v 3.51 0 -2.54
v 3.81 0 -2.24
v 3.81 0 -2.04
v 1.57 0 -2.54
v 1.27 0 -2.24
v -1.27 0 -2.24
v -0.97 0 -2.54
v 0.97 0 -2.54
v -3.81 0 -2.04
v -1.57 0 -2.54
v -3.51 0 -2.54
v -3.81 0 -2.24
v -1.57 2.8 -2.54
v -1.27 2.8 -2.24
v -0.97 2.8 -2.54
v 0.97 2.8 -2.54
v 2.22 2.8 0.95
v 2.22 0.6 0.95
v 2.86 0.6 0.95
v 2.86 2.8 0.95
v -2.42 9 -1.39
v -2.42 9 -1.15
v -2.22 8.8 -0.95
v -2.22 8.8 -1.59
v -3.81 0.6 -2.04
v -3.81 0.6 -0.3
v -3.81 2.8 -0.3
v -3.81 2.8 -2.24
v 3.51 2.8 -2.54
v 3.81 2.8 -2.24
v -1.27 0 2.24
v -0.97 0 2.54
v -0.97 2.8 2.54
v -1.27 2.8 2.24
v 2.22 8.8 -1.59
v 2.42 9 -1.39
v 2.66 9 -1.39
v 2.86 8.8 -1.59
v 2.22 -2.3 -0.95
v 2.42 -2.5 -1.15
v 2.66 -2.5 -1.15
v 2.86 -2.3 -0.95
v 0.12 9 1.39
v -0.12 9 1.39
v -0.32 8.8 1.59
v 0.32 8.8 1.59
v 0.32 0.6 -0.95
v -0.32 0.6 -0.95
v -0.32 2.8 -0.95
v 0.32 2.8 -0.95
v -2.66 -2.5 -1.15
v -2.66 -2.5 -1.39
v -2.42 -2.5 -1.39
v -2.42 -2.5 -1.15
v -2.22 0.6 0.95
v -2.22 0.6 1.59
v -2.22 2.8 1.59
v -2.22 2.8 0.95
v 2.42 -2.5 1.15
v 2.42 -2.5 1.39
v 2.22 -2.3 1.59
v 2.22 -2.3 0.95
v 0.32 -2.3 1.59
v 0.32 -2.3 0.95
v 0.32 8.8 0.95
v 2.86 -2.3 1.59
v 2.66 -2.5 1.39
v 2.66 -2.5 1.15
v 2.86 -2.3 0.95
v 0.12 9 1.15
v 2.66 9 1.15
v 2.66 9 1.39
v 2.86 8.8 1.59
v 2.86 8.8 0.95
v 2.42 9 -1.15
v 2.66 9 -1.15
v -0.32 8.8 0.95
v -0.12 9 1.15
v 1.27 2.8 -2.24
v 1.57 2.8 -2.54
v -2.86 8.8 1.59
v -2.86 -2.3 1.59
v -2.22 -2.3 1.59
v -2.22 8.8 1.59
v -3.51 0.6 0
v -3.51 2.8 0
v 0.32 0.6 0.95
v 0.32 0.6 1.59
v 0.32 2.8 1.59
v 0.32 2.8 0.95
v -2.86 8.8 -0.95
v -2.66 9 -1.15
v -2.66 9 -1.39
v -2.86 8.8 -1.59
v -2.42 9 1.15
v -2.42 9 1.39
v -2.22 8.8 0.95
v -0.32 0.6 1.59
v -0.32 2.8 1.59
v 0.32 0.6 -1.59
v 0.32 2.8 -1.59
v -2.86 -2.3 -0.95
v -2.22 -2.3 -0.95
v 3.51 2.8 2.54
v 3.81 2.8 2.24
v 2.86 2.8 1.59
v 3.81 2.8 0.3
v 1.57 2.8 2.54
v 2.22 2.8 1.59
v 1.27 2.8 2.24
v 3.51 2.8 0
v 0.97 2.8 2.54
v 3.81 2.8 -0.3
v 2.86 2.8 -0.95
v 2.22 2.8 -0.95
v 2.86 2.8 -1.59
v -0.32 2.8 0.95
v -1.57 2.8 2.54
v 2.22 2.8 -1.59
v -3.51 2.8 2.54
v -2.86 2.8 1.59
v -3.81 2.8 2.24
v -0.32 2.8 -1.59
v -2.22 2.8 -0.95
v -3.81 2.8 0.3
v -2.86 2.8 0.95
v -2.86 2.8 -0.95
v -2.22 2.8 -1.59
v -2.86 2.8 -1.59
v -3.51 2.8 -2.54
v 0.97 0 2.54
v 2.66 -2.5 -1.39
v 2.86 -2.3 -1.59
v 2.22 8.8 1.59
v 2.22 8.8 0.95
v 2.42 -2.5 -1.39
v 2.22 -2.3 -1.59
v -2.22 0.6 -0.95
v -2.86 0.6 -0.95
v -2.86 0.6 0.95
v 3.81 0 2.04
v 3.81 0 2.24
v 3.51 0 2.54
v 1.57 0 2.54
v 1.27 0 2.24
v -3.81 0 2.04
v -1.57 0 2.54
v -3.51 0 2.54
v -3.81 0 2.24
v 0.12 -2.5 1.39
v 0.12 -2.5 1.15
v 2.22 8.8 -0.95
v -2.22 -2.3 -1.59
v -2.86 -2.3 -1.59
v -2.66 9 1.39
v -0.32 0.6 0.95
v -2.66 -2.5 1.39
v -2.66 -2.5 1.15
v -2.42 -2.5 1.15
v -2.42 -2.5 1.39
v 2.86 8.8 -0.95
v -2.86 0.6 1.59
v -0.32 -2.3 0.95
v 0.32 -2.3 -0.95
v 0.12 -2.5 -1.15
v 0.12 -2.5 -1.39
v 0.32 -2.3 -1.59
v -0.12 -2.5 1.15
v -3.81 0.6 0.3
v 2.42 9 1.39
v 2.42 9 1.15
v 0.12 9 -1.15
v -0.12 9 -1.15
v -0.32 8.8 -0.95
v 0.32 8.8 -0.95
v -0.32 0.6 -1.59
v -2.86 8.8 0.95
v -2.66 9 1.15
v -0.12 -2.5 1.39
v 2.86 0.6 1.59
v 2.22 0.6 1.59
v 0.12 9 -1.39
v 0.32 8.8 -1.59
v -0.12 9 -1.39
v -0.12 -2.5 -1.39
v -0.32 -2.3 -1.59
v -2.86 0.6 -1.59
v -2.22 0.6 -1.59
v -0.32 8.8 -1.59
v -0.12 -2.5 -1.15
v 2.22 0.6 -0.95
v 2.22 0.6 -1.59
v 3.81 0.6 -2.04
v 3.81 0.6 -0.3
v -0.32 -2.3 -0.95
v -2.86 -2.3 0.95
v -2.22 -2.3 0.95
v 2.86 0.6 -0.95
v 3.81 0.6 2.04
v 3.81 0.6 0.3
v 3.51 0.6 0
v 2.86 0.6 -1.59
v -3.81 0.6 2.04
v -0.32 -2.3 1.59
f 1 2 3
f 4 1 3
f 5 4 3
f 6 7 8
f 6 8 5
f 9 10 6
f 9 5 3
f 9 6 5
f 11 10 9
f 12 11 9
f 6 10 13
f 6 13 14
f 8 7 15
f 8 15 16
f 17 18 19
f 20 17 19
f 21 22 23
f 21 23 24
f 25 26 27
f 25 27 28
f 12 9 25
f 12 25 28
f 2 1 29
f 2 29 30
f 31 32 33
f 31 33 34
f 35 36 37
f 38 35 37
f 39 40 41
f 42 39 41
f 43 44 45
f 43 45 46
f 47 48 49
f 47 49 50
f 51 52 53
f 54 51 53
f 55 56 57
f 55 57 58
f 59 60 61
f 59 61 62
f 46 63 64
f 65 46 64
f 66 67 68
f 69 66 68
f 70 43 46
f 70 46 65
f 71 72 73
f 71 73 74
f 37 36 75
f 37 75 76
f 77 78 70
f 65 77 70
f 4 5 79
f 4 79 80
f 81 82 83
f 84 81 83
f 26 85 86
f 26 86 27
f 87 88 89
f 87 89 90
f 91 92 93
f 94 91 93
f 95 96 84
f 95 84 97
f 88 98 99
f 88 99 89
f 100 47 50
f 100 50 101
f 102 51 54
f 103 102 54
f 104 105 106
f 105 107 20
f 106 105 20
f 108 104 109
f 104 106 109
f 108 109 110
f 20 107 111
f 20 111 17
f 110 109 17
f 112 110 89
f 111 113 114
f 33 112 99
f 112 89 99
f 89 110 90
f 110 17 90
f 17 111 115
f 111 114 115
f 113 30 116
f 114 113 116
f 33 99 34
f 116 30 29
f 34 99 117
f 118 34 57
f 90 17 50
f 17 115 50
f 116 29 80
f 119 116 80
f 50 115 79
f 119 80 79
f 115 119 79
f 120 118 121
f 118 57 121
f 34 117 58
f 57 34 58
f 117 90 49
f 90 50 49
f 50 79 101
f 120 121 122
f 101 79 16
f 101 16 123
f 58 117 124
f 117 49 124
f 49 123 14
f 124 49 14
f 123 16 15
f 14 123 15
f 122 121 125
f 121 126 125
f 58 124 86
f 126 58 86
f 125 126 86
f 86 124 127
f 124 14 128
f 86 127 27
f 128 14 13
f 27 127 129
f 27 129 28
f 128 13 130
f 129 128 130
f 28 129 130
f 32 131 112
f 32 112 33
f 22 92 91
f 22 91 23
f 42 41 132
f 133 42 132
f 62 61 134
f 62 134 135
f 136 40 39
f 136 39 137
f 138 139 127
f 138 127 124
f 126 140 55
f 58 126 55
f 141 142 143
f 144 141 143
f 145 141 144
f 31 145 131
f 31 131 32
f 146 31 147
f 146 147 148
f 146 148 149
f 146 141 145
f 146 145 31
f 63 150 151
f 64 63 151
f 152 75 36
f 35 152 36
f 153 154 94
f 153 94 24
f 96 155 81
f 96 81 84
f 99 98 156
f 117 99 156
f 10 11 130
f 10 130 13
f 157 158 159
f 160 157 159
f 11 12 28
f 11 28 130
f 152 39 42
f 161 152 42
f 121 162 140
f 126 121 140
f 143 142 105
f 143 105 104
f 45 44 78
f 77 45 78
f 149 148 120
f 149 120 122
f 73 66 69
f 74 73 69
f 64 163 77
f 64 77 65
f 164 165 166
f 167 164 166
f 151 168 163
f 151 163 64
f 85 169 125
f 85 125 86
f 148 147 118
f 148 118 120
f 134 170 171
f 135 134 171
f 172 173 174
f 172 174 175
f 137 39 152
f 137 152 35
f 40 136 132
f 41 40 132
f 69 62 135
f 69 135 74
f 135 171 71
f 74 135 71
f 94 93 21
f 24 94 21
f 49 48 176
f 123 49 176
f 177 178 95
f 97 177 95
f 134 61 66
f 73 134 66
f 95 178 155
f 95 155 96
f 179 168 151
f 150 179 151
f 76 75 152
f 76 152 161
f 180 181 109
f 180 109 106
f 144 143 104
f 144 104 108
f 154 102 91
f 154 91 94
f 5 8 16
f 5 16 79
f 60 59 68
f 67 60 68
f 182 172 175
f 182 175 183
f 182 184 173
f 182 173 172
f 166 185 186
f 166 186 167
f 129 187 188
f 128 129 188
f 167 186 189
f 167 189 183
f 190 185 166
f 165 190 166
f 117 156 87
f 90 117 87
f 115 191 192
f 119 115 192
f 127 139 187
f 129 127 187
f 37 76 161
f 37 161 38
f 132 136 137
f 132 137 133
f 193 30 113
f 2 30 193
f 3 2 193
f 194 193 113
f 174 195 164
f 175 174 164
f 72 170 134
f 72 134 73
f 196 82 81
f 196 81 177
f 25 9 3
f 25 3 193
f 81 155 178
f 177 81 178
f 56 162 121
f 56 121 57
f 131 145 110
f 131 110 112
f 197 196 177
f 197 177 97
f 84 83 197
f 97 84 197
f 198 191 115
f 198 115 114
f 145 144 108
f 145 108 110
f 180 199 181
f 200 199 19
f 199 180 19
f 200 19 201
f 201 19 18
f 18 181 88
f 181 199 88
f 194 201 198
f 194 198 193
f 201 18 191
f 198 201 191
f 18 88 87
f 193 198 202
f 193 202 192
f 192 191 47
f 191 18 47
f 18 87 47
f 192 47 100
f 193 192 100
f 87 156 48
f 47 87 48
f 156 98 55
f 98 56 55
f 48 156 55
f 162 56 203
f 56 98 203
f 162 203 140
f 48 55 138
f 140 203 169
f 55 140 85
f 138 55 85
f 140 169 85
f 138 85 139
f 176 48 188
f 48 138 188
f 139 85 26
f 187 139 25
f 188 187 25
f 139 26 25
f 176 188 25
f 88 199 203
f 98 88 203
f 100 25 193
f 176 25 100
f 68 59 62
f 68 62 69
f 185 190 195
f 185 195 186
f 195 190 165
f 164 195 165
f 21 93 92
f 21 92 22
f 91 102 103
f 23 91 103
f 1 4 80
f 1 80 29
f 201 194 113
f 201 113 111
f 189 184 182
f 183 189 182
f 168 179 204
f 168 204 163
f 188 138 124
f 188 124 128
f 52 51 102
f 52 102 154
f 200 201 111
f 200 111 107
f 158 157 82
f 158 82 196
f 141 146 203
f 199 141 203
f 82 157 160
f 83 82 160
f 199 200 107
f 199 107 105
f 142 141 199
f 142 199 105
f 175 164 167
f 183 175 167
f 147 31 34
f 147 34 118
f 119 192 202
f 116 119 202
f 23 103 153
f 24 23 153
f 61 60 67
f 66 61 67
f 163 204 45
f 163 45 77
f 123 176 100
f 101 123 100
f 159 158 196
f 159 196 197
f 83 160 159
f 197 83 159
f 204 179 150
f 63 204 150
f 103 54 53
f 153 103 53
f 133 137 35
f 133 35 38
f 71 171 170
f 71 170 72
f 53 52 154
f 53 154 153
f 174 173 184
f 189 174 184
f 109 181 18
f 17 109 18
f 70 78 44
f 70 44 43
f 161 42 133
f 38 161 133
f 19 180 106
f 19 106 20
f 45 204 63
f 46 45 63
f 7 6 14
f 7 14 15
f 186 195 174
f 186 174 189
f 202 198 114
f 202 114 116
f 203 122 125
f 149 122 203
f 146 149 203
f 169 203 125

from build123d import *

# Parameters (mm, degrees)
SKETCH1_W                  = 0.64
SKETCH1_H                  = 0.64
BOSS_EXTRUDE1_DEPTH        = 2.8
CUT_EXTRUDE1_DEPTH         = 6.367280503
CUT_EXTRUDE1_DEPTH_BACK    = 6.367280503
SKETCH2_W                  = 4.08
SKETCH2_H                  = 0.6
BOSS_EXTRUDE2_DEPTH        = 9
BOSS_EXTRUDE2_DEPTH_BACK   = 2.5
SKETCH1_2_W                = 0.64
SKETCH1_2_H                = 0.64
BOSS_EXTRUDE2_2_DEPTH      = 9
BOSS_EXTRUDE2_2_DEPTH_BACK = 2.5
BOSS_EXTRUDE2_3_DEPTH      = 9
BOSS_EXTRUDE2_3_DEPTH_BACK = 2.5
BOSS_EXTRUDE2_4_DEPTH      = 9
BOSS_EXTRUDE2_4_DEPTH_BACK = 2.5
BOSS_EXTRUDE2_5_DEPTH      = 9
BOSS_EXTRUDE2_5_DEPTH_BACK = 2.5
BOSS_EXTRUDE2_6_DEPTH      = 9
BOSS_EXTRUDE2_6_DEPTH_BACK = 2.5
CHAMFER1_SIZE              = 0.2
CHAMFER2_SIZE              = 0.2
CHAMFER3_SIZE              = 0.2
CHAMFER4_SIZE              = 0.2
CHAMFER5_SIZE              = 0.2
CHAMFER6_SIZE              = 0.2


with BuildPart() as part:
    # Sketch1 → Boss-Extrude1 (new body)
    with BuildSketch(Plane(origin=(0, 0, 0), x_dir=(1, 0, 0), z_dir=(0, 1, 0))):
        Polygon((-3.81, 2.24), (-3.51, 2.54), (-1.57, 2.54), (-1.27, 2.24), (-0.97, 2.54), (0.97, 2.54), (1.27, 2.24), (1.57, 2.54), (3.51, 2.54), (3.81, 2.24), (3.81, 0.3), (3.51, 0), (3.81, -0.3), (3.81, -2.24), (3.51, -2.54), (1.57, -2.54), (1.27, -2.24), (0.97, -2.54), (-0.97, -2.54), (-1.27, -2.24), (-1.57, -2.54), (-3.51, -2.54), (-3.81, -2.24), (-3.81, -0.3), (-3.51, 0), (-3.81, 0.3), align=None)
        with Locations((-2.54, 1.27)):
            Rectangle(SKETCH1_W, SKETCH1_H, mode=Mode.SUBTRACT)
        with Locations((0, 1.27)):
            Rectangle(SKETCH1_W, SKETCH1_H, mode=Mode.SUBTRACT)
        with Locations((2.54, 1.27)):
            Rectangle(SKETCH1_W, SKETCH1_H, mode=Mode.SUBTRACT)
        with Locations((0, -1.27)):
            Rectangle(SKETCH1_W, SKETCH1_H, mode=Mode.SUBTRACT)
        with Locations((2.54, -1.27)):
            Rectangle(SKETCH1_W, SKETCH1_H, mode=Mode.SUBTRACT)
        with Locations((-2.54, -1.27)):
            Rectangle(SKETCH1_W, SKETCH1_H, mode=Mode.SUBTRACT)
    extrude(amount=BOSS_EXTRUDE1_DEPTH)

    # Sketch2 → Cut-Extrude1 (cut, two sides: drawn at the far end of the back side and taken through both)
    with BuildSketch(Plane(origin=(0, 0, 0), x_dir=(0, 0, -1), z_dir=(1, 0, 0)).offset(-CUT_EXTRUDE1_DEPTH_BACK)):
        with Locations((0, 0.3)):
            Rectangle(SKETCH2_W, SKETCH2_H)
    extrude(amount=CUT_EXTRUDE1_DEPTH + CUT_EXTRUDE1_DEPTH_BACK, mode=Mode.SUBTRACT)


with BuildPart() as body_2:
    # Sketch1<2> → Boss-Extrude2 (new, two sides: drawn at the far end of the back side and taken through both)
    with BuildSketch(Plane(origin=(0, 0, 0), x_dir=(1, 0, 0), z_dir=(0, 1, 0)).offset(-BOSS_EXTRUDE2_DEPTH_BACK)):
        with Locations((-2.54, 1.27)):
            Rectangle(SKETCH1_2_W, SKETCH1_2_H)
    extrude(amount=BOSS_EXTRUDE2_DEPTH + BOSS_EXTRUDE2_DEPTH_BACK)

    # Chamfer1
    chamfer1_edges = [body_2.edges().sort_by_distance(p)[0] for p in [
        (-2.22, 9, -1.27),
        (-2.54, 9, -1.59),
        (-2.86, 9, -1.27),
        (-2.22, -2.5, -1.27),
        (-2.54, 9, -0.95),
        (-2.54, -2.5, -1.59),
        (-2.86, -2.5, -1.27),
        (-2.54, -2.5, -0.95),
    ]]
    chamfer(chamfer1_edges, length=CHAMFER1_SIZE)


with BuildPart() as body_3:
    # Sketch1<2> → Boss-Extrude2 2 (new, two sides: drawn at the far end of the back side and taken through both)
    with BuildSketch(Plane(origin=(0, 0, 0), x_dir=(1, 0, 0), z_dir=(0, 1, 0)).offset(-BOSS_EXTRUDE2_2_DEPTH_BACK)):
        with Locations((0, 1.27)):
            Rectangle(SKETCH1_2_W, SKETCH1_2_H)
    extrude(amount=BOSS_EXTRUDE2_2_DEPTH + BOSS_EXTRUDE2_2_DEPTH_BACK)

    # Chamfer4
    chamfer4_edges = [body_3.edges().sort_by_distance(p)[0] for p in [
        (-0.32, 9, -1.27),
        (0, 9, -0.95),
        (0.32, 9, -1.27),
        (0, 9, -1.59),
        (-0.32, -2.5, -1.27),
        (0, -2.5, -0.95),
        (0.32, -2.5, -1.27),
        (0, -2.5, -1.59),
    ]]
    chamfer(chamfer4_edges, length=CHAMFER4_SIZE)


with BuildPart() as body_4:
    # Sketch1<2> → Boss-Extrude2 3 (new, two sides: drawn at the far end of the back side and taken through both)
    with BuildSketch(Plane(origin=(0, 0, 0), x_dir=(1, 0, 0), z_dir=(0, 1, 0)).offset(-BOSS_EXTRUDE2_3_DEPTH_BACK)):
        with Locations((2.54, 1.27)):
            Rectangle(SKETCH1_2_W, SKETCH1_2_H)
    extrude(amount=BOSS_EXTRUDE2_3_DEPTH + BOSS_EXTRUDE2_3_DEPTH_BACK)

    # Chamfer6
    chamfer6_edges = [body_4.edges().sort_by_distance(p)[0] for p in [
        (2.22, 9, -1.27),
        (2.54, 9, -0.95),
        (2.86, 9, -1.27),
        (2.54, 9, -1.59),
        (2.22, -2.5, -1.27),
        (2.54, -2.5, -0.95),
        (2.86, -2.5, -1.27),
        (2.54, -2.5, -1.59),
    ]]
    chamfer(chamfer6_edges, length=CHAMFER6_SIZE)


with BuildPart() as body_5:
    # Sketch1<2> → Boss-Extrude2 4 (new, two sides: drawn at the far end of the back side and taken through both)
    with BuildSketch(Plane(origin=(0, 0, 0), x_dir=(1, 0, 0), z_dir=(0, 1, 0)).offset(-BOSS_EXTRUDE2_4_DEPTH_BACK)):
        with Locations((0, -1.27)):
            Rectangle(SKETCH1_2_W, SKETCH1_2_H)
    extrude(amount=BOSS_EXTRUDE2_4_DEPTH + BOSS_EXTRUDE2_4_DEPTH_BACK)

    # Chamfer3
    chamfer3_edges = [body_5.edges().sort_by_distance(p)[0] for p in [
        (-0.32, 9, 1.27),
        (0, 9, 1.59),
        (0.32, 9, 1.27),
        (0, 9, 0.95),
        (-0.32, -2.5, 1.27),
        (0, -2.5, 1.59),
        (0.32, -2.5, 1.27),
        (0, -2.5, 0.95),
    ]]
    chamfer(chamfer3_edges, length=CHAMFER3_SIZE)


with BuildPart() as body_6:
    # Sketch1<2> → Boss-Extrude2 5 (new, two sides: drawn at the far end of the back side and taken through both)
    with BuildSketch(Plane(origin=(0, 0, 0), x_dir=(1, 0, 0), z_dir=(0, 1, 0)).offset(-BOSS_EXTRUDE2_5_DEPTH_BACK)):
        with Locations((2.54, -1.27)):
            Rectangle(SKETCH1_2_W, SKETCH1_2_H)
    extrude(amount=BOSS_EXTRUDE2_5_DEPTH + BOSS_EXTRUDE2_5_DEPTH_BACK)

    # Chamfer5
    chamfer5_edges = [body_6.edges().sort_by_distance(p)[0] for p in [
        (2.22, 9, 1.27),
        (2.54, 9, 1.59),
        (2.86, 9, 1.27),
        (2.54, 9, 0.95),
        (2.22, -2.5, 1.27),
        (2.54, -2.5, 1.59),
        (2.86, -2.5, 1.27),
        (2.54, -2.5, 0.95),
    ]]
    chamfer(chamfer5_edges, length=CHAMFER5_SIZE)


with BuildPart() as body_7:
    # Sketch1<2> → Boss-Extrude2 6 (new, two sides: drawn at the far end of the back side and taken through both)
    with BuildSketch(Plane(origin=(0, 0, 0), x_dir=(1, 0, 0), z_dir=(0, 1, 0)).offset(-BOSS_EXTRUDE2_6_DEPTH_BACK)):
        with Locations((-2.54, -1.27)):
            Rectangle(SKETCH1_2_W, SKETCH1_2_H)
    extrude(amount=BOSS_EXTRUDE2_6_DEPTH + BOSS_EXTRUDE2_6_DEPTH_BACK)

    # Chamfer2
    chamfer2_edges = [body_7.edges().sort_by_distance(p)[0] for p in [
        (-2.86, 9, 1.27),
        (-2.54, 9, 1.59),
        (-2.22, 9, 1.27),
        (-2.54, 9, 0.95),
        (-2.86, -2.5, 1.27),
        (-2.54, -2.5, 1.59),
        (-2.22, -2.5, 1.27),
        (-2.54, -2.5, 0.95),
    ]]
    chamfer(chamfer2_edges, length=CHAMFER2_SIZE)


solid = Compound([part.part, body_2.part, body_3.part, body_4.part, body_5.part, body_6.part, body_7.part])
